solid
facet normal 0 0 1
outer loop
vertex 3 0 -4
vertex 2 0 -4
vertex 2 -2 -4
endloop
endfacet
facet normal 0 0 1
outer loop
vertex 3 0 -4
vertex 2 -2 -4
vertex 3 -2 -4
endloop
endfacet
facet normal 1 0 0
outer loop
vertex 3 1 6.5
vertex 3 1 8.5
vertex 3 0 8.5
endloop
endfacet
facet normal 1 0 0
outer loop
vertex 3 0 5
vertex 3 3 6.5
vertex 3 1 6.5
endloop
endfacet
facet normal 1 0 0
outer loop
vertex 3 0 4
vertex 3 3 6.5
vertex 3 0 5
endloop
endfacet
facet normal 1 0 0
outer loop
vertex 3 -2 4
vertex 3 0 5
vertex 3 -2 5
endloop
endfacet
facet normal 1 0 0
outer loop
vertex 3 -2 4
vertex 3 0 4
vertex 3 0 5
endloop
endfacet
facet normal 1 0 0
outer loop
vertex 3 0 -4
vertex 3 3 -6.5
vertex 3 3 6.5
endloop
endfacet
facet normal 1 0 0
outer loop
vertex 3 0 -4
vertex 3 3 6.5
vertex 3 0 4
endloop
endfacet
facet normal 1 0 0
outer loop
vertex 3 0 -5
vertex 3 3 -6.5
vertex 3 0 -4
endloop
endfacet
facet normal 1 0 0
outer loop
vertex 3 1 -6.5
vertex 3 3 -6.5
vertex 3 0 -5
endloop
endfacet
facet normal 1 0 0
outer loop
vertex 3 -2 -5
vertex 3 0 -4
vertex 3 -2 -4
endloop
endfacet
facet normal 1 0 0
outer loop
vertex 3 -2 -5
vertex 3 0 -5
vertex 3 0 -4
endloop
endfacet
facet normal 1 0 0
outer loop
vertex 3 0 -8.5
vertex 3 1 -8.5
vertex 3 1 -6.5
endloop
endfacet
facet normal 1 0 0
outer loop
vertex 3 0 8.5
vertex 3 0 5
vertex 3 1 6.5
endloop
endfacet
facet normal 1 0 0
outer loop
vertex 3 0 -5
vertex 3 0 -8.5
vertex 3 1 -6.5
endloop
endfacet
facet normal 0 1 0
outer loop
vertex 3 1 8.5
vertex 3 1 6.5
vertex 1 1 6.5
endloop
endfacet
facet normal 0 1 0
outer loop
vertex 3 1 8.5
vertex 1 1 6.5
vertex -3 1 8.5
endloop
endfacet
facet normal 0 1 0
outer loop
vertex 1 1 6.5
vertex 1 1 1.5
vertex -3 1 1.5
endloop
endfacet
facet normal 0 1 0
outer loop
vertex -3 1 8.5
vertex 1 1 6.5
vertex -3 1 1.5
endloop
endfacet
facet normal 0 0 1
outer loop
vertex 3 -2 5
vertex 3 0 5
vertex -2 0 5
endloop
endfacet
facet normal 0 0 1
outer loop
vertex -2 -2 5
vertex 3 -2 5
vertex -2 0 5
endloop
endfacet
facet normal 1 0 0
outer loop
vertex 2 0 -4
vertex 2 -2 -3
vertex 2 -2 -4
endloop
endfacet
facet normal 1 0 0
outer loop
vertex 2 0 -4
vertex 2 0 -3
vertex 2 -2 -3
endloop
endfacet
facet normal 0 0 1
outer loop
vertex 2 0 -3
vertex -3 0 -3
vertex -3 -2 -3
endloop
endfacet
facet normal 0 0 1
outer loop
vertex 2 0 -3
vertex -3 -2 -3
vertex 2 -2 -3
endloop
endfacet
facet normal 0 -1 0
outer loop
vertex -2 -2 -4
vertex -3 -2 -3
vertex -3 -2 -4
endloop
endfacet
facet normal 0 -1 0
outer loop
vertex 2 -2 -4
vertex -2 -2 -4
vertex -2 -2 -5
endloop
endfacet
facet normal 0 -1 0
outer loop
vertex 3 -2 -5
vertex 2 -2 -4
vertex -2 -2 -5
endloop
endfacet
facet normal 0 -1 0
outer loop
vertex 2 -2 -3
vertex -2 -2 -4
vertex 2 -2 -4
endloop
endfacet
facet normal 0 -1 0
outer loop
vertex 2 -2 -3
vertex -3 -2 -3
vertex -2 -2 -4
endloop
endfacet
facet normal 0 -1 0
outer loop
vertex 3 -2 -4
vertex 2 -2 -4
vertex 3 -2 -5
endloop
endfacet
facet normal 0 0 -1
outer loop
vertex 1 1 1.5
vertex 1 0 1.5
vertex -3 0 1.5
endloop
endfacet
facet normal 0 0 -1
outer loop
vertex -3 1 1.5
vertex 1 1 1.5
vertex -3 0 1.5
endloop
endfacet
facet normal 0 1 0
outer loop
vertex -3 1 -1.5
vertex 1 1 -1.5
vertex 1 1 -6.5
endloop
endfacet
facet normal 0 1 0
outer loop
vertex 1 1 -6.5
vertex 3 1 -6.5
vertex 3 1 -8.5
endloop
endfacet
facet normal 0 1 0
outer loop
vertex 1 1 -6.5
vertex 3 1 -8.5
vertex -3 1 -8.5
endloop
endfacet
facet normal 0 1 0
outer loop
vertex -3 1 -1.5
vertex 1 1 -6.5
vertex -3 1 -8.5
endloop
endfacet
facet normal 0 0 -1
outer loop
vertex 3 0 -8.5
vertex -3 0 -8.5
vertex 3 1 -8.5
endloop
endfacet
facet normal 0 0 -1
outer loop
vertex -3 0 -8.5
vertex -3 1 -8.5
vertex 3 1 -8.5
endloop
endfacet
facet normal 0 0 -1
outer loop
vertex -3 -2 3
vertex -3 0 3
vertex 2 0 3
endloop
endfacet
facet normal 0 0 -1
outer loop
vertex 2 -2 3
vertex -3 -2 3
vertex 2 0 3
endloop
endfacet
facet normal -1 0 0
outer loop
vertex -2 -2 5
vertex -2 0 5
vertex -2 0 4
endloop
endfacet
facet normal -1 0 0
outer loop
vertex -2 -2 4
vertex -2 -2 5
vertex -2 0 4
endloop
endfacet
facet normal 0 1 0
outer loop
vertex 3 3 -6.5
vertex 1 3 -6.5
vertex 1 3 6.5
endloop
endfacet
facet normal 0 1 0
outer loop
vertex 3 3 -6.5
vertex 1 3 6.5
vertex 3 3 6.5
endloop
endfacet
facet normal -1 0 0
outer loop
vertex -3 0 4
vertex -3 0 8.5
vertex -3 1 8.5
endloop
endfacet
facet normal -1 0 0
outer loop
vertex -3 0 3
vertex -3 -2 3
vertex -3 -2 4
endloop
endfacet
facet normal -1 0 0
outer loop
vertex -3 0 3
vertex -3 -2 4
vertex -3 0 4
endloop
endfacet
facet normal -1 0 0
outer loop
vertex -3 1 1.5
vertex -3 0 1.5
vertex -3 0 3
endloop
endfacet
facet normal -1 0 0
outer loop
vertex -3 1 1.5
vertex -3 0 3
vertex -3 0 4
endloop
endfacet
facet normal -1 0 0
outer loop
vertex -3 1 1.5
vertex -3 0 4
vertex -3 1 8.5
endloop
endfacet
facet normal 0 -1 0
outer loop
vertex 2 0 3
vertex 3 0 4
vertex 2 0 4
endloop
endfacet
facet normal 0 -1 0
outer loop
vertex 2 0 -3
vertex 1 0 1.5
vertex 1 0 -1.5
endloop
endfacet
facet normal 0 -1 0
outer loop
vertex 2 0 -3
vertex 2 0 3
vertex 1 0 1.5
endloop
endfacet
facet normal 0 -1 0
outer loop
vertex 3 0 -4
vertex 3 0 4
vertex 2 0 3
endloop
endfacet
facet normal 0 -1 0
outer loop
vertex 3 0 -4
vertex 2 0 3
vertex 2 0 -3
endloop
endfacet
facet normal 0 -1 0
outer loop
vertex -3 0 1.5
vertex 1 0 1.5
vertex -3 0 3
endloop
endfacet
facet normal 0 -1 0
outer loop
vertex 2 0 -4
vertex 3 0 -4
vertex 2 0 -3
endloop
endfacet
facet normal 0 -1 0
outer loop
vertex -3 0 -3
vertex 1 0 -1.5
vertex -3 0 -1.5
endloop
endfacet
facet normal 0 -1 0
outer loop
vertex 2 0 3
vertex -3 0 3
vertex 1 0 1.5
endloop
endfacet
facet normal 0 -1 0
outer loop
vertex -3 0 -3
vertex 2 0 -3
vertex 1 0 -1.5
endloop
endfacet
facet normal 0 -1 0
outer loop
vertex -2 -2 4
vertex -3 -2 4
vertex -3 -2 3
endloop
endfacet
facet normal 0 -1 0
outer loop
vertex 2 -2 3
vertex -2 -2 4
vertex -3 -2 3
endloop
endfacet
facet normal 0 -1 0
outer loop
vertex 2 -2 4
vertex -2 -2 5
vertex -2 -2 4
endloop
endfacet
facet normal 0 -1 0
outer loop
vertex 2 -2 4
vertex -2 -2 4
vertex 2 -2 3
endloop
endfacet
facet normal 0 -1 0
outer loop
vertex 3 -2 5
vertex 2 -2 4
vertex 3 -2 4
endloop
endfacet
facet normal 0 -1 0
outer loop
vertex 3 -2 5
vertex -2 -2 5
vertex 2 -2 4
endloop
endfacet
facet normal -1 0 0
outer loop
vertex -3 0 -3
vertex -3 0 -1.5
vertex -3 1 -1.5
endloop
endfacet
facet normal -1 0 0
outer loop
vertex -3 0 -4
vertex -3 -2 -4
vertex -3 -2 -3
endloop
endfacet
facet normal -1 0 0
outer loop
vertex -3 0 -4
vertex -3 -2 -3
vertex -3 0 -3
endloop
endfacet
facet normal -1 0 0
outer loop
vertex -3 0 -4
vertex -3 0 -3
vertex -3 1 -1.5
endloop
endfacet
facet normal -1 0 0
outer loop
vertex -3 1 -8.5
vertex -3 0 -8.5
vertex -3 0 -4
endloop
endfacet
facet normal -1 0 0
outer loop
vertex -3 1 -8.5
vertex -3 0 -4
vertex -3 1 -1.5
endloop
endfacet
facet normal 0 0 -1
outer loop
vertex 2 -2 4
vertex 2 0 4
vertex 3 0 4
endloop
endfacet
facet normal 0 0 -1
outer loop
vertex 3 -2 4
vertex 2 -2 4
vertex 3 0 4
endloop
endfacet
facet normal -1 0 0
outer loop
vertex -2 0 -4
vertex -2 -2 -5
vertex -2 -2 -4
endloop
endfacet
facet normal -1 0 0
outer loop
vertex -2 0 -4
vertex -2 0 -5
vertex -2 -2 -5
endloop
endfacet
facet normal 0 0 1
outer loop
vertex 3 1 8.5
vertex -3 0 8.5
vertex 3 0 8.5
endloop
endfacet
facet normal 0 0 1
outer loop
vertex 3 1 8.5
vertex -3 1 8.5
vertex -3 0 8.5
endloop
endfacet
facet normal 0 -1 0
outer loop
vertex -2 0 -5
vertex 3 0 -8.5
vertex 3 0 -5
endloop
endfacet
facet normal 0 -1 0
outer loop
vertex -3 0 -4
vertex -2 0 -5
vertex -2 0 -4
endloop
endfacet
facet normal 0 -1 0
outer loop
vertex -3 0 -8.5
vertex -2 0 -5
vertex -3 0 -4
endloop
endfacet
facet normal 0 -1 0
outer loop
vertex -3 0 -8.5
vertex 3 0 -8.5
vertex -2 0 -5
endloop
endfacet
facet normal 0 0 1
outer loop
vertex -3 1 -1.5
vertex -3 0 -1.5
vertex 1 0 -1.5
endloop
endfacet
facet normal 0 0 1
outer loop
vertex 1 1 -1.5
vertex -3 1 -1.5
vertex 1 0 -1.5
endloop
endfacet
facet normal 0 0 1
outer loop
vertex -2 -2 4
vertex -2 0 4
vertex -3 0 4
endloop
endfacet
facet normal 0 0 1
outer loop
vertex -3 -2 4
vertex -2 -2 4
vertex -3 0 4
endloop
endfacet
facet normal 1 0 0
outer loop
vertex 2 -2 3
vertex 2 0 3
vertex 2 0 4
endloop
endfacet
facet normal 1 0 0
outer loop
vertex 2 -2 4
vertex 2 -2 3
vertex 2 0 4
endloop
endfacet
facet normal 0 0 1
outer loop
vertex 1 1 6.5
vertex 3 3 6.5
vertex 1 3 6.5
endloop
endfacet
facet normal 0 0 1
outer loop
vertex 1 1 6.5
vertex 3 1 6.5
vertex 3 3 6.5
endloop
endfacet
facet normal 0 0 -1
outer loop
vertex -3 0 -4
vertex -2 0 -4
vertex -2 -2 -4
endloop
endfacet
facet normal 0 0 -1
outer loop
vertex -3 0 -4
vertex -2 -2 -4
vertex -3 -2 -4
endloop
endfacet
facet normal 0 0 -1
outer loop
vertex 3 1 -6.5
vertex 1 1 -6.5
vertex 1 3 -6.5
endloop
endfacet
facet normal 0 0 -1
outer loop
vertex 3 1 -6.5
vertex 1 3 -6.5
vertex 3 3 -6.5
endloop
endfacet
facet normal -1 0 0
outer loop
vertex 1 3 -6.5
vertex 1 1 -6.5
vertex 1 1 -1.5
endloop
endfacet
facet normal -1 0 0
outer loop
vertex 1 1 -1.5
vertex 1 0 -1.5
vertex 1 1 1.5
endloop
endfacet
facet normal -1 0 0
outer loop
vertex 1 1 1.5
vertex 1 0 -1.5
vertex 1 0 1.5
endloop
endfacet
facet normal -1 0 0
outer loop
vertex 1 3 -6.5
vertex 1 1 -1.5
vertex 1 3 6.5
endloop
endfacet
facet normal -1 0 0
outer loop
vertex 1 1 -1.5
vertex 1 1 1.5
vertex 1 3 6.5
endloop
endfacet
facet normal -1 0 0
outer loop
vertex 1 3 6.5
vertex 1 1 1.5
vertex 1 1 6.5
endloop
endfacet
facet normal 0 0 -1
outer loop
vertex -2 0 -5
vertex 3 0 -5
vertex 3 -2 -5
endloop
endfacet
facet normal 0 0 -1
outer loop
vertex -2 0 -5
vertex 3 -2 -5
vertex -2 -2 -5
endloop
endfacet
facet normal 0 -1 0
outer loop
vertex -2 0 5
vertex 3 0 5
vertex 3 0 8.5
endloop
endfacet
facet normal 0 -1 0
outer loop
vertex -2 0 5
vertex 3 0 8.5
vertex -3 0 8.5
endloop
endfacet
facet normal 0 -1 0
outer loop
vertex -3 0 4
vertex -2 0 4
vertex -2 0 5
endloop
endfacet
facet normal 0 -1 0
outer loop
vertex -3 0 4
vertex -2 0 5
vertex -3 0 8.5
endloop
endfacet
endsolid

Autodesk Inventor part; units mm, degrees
ref_plane "YZ Plane" through (0, 0, 0) normal (1, 0, 0) x (0, 1, 0)
ref_plane "XZ Plane" through (0, 0, 0) normal (0, 1, 0) x (-1, 0, 0)
ref_plane "XY Plane" through (0, 0, 0) normal (0, 0, 1) x (1, 0, 0)
sketch "Sketch1" plane through (0, 0, 0) normal (0, 0, 1) x (1, 0, 0)
  line L0 (3, 1) -> (3, 0)
  line L1 (3, 0) -> (-3, 0)
  line L2 (-3, 0) -> (-3, 1)
  line L3 (3, 1) -> (-3, 1)
  point P0 (0, 0)
  point P1 (0, 0)
  dimension "d0" = 6
  dimension "d6" = 1
extrude "Extrusion1" add sketch "Sketch1" along normal mid plane 17
sketch "Sketch2" plane through (-3, 0, 8.5) normal (0, -1, 0) x (1, 0, 0)
  line L0 (0, -5.5) -> (5, -5.5)
  line L1 (5, -5.5) -> (5, -4.5)
  line L2 (1, -4.5) -> (0, -4.5)
  line L3 (0, -4.5) -> (0, -5.5)
  line L4 (6, -3.5) -> (1, -3.5)
  line L5 (1, -3.5) -> (1, -4.5)
  line L6 (5, -4.5) -> (6, -4.5)
  line L7 (6, -4.5) -> (6, -3.5)
  line L8 (0, -17) -> (0, 0) projected
  line L9 (6, 0) -> (6, -17) projected
  line L10 (6, 0) -> (0, 0) projected
  line L11 (6, 0) -> (0, 0) projected
  line L12 (0, -17) -> (0, 0) projected
  line L13 (0, -17) -> (6, -17) projected
  line L14 (6, 0) -> (6, -17) projected
  line L15 (-1.2, -8.5) -> (7.2, -8.5) projected
  line L16 (5, -11.5) -> (5, -12.5)
  line L17 (1, -12.5) -> (0, -12.5)
  line L18 (0, -12.5) -> (0, -11.5)
  line L19 (6, -13.5) -> (1, -13.5)
  line L20 (1, -13.5) -> (1, -12.5)
  line L21 (5, -12.5) -> (6, -12.5)
  line L22 (6, -12.5) -> (6, -13.5)
  line L23 (0, -11.5) -> (5, -11.5)
  point P0 (3, -8.5)
  dimension "d7" = 1
  dimension "d8" = 1
  dimension "d9" = 2
  dimension "d10" = 3.5
extrude "Extrusion2" add sketch "Sketch2" along normal blind 2 contours L3 L2 L5 L4 L7 L6 L1 L0 | L23 L16 L21 L9 L19 L20 L17 L8
sketch "Sketch3" plane through (-3, 0, 3) normal (0, -1, 0) x (1, 0, 0)
  line L0 (6, 1) -> (5, 1) projected
  line L1 (5, 1) -> (5, 0) projected
  line L2 (5, 0) -> (0, 0) projected
  line L3 (0, -6) -> (0, 0) projected
  line L4 (0, -6) -> (5, -6) projected
  line L5 (5, -6) -> (5, -7) projected
  line L6 (5, -7) -> (6, -7) projected
  line L7 (6, 1) -> (6, -7) projected
  line L8 (4, -1.5) -> (0, -1.5)
  line L9 (0, -1.5) -> (0, -4.5)
  line L10 (0, -4.5) -> (4, -4.5)
  line L11 (4, -4.5) -> (4, -1.5)
  line L12 (0, -6) -> (0, 0) projected
  line L13 (-1.2, -3) -> (7.2, -3) projected
  point P0 (3, -3)
  point P1 (0, -3)
  dimension "d13" = 4
  dimension "d14" = 3
extrude "Extrusion3" cut sketch "Sketch3" against normal through all contours L13 L3 L8 L11 | L11 L10 L3 L13
sketch "Sketch4" plane through (-3, 1, 8.5) normal (0, 1, 0) x (1, 0, 0)
  line L0 (6, 2) -> (4, 2)
  line L1 (4, 2) -> (4, 15)
  line L2 (4, 15) -> (6, 15)
  line L3 (6, 15) -> (6, 2)
  line L4 (-1.2, 8.5) -> (7.2, 8.5) projected
  line L5 (6, 17) -> (6, 0) projected
  line L6 (4, 10) -> (4, 7) projected
  point P0 (3, 8.5)
  dimension "d17" = 13
extrude "Extrusion4" add sketch "Sketch4" along normal blind 2
properties part number "track" material "Rubber"
